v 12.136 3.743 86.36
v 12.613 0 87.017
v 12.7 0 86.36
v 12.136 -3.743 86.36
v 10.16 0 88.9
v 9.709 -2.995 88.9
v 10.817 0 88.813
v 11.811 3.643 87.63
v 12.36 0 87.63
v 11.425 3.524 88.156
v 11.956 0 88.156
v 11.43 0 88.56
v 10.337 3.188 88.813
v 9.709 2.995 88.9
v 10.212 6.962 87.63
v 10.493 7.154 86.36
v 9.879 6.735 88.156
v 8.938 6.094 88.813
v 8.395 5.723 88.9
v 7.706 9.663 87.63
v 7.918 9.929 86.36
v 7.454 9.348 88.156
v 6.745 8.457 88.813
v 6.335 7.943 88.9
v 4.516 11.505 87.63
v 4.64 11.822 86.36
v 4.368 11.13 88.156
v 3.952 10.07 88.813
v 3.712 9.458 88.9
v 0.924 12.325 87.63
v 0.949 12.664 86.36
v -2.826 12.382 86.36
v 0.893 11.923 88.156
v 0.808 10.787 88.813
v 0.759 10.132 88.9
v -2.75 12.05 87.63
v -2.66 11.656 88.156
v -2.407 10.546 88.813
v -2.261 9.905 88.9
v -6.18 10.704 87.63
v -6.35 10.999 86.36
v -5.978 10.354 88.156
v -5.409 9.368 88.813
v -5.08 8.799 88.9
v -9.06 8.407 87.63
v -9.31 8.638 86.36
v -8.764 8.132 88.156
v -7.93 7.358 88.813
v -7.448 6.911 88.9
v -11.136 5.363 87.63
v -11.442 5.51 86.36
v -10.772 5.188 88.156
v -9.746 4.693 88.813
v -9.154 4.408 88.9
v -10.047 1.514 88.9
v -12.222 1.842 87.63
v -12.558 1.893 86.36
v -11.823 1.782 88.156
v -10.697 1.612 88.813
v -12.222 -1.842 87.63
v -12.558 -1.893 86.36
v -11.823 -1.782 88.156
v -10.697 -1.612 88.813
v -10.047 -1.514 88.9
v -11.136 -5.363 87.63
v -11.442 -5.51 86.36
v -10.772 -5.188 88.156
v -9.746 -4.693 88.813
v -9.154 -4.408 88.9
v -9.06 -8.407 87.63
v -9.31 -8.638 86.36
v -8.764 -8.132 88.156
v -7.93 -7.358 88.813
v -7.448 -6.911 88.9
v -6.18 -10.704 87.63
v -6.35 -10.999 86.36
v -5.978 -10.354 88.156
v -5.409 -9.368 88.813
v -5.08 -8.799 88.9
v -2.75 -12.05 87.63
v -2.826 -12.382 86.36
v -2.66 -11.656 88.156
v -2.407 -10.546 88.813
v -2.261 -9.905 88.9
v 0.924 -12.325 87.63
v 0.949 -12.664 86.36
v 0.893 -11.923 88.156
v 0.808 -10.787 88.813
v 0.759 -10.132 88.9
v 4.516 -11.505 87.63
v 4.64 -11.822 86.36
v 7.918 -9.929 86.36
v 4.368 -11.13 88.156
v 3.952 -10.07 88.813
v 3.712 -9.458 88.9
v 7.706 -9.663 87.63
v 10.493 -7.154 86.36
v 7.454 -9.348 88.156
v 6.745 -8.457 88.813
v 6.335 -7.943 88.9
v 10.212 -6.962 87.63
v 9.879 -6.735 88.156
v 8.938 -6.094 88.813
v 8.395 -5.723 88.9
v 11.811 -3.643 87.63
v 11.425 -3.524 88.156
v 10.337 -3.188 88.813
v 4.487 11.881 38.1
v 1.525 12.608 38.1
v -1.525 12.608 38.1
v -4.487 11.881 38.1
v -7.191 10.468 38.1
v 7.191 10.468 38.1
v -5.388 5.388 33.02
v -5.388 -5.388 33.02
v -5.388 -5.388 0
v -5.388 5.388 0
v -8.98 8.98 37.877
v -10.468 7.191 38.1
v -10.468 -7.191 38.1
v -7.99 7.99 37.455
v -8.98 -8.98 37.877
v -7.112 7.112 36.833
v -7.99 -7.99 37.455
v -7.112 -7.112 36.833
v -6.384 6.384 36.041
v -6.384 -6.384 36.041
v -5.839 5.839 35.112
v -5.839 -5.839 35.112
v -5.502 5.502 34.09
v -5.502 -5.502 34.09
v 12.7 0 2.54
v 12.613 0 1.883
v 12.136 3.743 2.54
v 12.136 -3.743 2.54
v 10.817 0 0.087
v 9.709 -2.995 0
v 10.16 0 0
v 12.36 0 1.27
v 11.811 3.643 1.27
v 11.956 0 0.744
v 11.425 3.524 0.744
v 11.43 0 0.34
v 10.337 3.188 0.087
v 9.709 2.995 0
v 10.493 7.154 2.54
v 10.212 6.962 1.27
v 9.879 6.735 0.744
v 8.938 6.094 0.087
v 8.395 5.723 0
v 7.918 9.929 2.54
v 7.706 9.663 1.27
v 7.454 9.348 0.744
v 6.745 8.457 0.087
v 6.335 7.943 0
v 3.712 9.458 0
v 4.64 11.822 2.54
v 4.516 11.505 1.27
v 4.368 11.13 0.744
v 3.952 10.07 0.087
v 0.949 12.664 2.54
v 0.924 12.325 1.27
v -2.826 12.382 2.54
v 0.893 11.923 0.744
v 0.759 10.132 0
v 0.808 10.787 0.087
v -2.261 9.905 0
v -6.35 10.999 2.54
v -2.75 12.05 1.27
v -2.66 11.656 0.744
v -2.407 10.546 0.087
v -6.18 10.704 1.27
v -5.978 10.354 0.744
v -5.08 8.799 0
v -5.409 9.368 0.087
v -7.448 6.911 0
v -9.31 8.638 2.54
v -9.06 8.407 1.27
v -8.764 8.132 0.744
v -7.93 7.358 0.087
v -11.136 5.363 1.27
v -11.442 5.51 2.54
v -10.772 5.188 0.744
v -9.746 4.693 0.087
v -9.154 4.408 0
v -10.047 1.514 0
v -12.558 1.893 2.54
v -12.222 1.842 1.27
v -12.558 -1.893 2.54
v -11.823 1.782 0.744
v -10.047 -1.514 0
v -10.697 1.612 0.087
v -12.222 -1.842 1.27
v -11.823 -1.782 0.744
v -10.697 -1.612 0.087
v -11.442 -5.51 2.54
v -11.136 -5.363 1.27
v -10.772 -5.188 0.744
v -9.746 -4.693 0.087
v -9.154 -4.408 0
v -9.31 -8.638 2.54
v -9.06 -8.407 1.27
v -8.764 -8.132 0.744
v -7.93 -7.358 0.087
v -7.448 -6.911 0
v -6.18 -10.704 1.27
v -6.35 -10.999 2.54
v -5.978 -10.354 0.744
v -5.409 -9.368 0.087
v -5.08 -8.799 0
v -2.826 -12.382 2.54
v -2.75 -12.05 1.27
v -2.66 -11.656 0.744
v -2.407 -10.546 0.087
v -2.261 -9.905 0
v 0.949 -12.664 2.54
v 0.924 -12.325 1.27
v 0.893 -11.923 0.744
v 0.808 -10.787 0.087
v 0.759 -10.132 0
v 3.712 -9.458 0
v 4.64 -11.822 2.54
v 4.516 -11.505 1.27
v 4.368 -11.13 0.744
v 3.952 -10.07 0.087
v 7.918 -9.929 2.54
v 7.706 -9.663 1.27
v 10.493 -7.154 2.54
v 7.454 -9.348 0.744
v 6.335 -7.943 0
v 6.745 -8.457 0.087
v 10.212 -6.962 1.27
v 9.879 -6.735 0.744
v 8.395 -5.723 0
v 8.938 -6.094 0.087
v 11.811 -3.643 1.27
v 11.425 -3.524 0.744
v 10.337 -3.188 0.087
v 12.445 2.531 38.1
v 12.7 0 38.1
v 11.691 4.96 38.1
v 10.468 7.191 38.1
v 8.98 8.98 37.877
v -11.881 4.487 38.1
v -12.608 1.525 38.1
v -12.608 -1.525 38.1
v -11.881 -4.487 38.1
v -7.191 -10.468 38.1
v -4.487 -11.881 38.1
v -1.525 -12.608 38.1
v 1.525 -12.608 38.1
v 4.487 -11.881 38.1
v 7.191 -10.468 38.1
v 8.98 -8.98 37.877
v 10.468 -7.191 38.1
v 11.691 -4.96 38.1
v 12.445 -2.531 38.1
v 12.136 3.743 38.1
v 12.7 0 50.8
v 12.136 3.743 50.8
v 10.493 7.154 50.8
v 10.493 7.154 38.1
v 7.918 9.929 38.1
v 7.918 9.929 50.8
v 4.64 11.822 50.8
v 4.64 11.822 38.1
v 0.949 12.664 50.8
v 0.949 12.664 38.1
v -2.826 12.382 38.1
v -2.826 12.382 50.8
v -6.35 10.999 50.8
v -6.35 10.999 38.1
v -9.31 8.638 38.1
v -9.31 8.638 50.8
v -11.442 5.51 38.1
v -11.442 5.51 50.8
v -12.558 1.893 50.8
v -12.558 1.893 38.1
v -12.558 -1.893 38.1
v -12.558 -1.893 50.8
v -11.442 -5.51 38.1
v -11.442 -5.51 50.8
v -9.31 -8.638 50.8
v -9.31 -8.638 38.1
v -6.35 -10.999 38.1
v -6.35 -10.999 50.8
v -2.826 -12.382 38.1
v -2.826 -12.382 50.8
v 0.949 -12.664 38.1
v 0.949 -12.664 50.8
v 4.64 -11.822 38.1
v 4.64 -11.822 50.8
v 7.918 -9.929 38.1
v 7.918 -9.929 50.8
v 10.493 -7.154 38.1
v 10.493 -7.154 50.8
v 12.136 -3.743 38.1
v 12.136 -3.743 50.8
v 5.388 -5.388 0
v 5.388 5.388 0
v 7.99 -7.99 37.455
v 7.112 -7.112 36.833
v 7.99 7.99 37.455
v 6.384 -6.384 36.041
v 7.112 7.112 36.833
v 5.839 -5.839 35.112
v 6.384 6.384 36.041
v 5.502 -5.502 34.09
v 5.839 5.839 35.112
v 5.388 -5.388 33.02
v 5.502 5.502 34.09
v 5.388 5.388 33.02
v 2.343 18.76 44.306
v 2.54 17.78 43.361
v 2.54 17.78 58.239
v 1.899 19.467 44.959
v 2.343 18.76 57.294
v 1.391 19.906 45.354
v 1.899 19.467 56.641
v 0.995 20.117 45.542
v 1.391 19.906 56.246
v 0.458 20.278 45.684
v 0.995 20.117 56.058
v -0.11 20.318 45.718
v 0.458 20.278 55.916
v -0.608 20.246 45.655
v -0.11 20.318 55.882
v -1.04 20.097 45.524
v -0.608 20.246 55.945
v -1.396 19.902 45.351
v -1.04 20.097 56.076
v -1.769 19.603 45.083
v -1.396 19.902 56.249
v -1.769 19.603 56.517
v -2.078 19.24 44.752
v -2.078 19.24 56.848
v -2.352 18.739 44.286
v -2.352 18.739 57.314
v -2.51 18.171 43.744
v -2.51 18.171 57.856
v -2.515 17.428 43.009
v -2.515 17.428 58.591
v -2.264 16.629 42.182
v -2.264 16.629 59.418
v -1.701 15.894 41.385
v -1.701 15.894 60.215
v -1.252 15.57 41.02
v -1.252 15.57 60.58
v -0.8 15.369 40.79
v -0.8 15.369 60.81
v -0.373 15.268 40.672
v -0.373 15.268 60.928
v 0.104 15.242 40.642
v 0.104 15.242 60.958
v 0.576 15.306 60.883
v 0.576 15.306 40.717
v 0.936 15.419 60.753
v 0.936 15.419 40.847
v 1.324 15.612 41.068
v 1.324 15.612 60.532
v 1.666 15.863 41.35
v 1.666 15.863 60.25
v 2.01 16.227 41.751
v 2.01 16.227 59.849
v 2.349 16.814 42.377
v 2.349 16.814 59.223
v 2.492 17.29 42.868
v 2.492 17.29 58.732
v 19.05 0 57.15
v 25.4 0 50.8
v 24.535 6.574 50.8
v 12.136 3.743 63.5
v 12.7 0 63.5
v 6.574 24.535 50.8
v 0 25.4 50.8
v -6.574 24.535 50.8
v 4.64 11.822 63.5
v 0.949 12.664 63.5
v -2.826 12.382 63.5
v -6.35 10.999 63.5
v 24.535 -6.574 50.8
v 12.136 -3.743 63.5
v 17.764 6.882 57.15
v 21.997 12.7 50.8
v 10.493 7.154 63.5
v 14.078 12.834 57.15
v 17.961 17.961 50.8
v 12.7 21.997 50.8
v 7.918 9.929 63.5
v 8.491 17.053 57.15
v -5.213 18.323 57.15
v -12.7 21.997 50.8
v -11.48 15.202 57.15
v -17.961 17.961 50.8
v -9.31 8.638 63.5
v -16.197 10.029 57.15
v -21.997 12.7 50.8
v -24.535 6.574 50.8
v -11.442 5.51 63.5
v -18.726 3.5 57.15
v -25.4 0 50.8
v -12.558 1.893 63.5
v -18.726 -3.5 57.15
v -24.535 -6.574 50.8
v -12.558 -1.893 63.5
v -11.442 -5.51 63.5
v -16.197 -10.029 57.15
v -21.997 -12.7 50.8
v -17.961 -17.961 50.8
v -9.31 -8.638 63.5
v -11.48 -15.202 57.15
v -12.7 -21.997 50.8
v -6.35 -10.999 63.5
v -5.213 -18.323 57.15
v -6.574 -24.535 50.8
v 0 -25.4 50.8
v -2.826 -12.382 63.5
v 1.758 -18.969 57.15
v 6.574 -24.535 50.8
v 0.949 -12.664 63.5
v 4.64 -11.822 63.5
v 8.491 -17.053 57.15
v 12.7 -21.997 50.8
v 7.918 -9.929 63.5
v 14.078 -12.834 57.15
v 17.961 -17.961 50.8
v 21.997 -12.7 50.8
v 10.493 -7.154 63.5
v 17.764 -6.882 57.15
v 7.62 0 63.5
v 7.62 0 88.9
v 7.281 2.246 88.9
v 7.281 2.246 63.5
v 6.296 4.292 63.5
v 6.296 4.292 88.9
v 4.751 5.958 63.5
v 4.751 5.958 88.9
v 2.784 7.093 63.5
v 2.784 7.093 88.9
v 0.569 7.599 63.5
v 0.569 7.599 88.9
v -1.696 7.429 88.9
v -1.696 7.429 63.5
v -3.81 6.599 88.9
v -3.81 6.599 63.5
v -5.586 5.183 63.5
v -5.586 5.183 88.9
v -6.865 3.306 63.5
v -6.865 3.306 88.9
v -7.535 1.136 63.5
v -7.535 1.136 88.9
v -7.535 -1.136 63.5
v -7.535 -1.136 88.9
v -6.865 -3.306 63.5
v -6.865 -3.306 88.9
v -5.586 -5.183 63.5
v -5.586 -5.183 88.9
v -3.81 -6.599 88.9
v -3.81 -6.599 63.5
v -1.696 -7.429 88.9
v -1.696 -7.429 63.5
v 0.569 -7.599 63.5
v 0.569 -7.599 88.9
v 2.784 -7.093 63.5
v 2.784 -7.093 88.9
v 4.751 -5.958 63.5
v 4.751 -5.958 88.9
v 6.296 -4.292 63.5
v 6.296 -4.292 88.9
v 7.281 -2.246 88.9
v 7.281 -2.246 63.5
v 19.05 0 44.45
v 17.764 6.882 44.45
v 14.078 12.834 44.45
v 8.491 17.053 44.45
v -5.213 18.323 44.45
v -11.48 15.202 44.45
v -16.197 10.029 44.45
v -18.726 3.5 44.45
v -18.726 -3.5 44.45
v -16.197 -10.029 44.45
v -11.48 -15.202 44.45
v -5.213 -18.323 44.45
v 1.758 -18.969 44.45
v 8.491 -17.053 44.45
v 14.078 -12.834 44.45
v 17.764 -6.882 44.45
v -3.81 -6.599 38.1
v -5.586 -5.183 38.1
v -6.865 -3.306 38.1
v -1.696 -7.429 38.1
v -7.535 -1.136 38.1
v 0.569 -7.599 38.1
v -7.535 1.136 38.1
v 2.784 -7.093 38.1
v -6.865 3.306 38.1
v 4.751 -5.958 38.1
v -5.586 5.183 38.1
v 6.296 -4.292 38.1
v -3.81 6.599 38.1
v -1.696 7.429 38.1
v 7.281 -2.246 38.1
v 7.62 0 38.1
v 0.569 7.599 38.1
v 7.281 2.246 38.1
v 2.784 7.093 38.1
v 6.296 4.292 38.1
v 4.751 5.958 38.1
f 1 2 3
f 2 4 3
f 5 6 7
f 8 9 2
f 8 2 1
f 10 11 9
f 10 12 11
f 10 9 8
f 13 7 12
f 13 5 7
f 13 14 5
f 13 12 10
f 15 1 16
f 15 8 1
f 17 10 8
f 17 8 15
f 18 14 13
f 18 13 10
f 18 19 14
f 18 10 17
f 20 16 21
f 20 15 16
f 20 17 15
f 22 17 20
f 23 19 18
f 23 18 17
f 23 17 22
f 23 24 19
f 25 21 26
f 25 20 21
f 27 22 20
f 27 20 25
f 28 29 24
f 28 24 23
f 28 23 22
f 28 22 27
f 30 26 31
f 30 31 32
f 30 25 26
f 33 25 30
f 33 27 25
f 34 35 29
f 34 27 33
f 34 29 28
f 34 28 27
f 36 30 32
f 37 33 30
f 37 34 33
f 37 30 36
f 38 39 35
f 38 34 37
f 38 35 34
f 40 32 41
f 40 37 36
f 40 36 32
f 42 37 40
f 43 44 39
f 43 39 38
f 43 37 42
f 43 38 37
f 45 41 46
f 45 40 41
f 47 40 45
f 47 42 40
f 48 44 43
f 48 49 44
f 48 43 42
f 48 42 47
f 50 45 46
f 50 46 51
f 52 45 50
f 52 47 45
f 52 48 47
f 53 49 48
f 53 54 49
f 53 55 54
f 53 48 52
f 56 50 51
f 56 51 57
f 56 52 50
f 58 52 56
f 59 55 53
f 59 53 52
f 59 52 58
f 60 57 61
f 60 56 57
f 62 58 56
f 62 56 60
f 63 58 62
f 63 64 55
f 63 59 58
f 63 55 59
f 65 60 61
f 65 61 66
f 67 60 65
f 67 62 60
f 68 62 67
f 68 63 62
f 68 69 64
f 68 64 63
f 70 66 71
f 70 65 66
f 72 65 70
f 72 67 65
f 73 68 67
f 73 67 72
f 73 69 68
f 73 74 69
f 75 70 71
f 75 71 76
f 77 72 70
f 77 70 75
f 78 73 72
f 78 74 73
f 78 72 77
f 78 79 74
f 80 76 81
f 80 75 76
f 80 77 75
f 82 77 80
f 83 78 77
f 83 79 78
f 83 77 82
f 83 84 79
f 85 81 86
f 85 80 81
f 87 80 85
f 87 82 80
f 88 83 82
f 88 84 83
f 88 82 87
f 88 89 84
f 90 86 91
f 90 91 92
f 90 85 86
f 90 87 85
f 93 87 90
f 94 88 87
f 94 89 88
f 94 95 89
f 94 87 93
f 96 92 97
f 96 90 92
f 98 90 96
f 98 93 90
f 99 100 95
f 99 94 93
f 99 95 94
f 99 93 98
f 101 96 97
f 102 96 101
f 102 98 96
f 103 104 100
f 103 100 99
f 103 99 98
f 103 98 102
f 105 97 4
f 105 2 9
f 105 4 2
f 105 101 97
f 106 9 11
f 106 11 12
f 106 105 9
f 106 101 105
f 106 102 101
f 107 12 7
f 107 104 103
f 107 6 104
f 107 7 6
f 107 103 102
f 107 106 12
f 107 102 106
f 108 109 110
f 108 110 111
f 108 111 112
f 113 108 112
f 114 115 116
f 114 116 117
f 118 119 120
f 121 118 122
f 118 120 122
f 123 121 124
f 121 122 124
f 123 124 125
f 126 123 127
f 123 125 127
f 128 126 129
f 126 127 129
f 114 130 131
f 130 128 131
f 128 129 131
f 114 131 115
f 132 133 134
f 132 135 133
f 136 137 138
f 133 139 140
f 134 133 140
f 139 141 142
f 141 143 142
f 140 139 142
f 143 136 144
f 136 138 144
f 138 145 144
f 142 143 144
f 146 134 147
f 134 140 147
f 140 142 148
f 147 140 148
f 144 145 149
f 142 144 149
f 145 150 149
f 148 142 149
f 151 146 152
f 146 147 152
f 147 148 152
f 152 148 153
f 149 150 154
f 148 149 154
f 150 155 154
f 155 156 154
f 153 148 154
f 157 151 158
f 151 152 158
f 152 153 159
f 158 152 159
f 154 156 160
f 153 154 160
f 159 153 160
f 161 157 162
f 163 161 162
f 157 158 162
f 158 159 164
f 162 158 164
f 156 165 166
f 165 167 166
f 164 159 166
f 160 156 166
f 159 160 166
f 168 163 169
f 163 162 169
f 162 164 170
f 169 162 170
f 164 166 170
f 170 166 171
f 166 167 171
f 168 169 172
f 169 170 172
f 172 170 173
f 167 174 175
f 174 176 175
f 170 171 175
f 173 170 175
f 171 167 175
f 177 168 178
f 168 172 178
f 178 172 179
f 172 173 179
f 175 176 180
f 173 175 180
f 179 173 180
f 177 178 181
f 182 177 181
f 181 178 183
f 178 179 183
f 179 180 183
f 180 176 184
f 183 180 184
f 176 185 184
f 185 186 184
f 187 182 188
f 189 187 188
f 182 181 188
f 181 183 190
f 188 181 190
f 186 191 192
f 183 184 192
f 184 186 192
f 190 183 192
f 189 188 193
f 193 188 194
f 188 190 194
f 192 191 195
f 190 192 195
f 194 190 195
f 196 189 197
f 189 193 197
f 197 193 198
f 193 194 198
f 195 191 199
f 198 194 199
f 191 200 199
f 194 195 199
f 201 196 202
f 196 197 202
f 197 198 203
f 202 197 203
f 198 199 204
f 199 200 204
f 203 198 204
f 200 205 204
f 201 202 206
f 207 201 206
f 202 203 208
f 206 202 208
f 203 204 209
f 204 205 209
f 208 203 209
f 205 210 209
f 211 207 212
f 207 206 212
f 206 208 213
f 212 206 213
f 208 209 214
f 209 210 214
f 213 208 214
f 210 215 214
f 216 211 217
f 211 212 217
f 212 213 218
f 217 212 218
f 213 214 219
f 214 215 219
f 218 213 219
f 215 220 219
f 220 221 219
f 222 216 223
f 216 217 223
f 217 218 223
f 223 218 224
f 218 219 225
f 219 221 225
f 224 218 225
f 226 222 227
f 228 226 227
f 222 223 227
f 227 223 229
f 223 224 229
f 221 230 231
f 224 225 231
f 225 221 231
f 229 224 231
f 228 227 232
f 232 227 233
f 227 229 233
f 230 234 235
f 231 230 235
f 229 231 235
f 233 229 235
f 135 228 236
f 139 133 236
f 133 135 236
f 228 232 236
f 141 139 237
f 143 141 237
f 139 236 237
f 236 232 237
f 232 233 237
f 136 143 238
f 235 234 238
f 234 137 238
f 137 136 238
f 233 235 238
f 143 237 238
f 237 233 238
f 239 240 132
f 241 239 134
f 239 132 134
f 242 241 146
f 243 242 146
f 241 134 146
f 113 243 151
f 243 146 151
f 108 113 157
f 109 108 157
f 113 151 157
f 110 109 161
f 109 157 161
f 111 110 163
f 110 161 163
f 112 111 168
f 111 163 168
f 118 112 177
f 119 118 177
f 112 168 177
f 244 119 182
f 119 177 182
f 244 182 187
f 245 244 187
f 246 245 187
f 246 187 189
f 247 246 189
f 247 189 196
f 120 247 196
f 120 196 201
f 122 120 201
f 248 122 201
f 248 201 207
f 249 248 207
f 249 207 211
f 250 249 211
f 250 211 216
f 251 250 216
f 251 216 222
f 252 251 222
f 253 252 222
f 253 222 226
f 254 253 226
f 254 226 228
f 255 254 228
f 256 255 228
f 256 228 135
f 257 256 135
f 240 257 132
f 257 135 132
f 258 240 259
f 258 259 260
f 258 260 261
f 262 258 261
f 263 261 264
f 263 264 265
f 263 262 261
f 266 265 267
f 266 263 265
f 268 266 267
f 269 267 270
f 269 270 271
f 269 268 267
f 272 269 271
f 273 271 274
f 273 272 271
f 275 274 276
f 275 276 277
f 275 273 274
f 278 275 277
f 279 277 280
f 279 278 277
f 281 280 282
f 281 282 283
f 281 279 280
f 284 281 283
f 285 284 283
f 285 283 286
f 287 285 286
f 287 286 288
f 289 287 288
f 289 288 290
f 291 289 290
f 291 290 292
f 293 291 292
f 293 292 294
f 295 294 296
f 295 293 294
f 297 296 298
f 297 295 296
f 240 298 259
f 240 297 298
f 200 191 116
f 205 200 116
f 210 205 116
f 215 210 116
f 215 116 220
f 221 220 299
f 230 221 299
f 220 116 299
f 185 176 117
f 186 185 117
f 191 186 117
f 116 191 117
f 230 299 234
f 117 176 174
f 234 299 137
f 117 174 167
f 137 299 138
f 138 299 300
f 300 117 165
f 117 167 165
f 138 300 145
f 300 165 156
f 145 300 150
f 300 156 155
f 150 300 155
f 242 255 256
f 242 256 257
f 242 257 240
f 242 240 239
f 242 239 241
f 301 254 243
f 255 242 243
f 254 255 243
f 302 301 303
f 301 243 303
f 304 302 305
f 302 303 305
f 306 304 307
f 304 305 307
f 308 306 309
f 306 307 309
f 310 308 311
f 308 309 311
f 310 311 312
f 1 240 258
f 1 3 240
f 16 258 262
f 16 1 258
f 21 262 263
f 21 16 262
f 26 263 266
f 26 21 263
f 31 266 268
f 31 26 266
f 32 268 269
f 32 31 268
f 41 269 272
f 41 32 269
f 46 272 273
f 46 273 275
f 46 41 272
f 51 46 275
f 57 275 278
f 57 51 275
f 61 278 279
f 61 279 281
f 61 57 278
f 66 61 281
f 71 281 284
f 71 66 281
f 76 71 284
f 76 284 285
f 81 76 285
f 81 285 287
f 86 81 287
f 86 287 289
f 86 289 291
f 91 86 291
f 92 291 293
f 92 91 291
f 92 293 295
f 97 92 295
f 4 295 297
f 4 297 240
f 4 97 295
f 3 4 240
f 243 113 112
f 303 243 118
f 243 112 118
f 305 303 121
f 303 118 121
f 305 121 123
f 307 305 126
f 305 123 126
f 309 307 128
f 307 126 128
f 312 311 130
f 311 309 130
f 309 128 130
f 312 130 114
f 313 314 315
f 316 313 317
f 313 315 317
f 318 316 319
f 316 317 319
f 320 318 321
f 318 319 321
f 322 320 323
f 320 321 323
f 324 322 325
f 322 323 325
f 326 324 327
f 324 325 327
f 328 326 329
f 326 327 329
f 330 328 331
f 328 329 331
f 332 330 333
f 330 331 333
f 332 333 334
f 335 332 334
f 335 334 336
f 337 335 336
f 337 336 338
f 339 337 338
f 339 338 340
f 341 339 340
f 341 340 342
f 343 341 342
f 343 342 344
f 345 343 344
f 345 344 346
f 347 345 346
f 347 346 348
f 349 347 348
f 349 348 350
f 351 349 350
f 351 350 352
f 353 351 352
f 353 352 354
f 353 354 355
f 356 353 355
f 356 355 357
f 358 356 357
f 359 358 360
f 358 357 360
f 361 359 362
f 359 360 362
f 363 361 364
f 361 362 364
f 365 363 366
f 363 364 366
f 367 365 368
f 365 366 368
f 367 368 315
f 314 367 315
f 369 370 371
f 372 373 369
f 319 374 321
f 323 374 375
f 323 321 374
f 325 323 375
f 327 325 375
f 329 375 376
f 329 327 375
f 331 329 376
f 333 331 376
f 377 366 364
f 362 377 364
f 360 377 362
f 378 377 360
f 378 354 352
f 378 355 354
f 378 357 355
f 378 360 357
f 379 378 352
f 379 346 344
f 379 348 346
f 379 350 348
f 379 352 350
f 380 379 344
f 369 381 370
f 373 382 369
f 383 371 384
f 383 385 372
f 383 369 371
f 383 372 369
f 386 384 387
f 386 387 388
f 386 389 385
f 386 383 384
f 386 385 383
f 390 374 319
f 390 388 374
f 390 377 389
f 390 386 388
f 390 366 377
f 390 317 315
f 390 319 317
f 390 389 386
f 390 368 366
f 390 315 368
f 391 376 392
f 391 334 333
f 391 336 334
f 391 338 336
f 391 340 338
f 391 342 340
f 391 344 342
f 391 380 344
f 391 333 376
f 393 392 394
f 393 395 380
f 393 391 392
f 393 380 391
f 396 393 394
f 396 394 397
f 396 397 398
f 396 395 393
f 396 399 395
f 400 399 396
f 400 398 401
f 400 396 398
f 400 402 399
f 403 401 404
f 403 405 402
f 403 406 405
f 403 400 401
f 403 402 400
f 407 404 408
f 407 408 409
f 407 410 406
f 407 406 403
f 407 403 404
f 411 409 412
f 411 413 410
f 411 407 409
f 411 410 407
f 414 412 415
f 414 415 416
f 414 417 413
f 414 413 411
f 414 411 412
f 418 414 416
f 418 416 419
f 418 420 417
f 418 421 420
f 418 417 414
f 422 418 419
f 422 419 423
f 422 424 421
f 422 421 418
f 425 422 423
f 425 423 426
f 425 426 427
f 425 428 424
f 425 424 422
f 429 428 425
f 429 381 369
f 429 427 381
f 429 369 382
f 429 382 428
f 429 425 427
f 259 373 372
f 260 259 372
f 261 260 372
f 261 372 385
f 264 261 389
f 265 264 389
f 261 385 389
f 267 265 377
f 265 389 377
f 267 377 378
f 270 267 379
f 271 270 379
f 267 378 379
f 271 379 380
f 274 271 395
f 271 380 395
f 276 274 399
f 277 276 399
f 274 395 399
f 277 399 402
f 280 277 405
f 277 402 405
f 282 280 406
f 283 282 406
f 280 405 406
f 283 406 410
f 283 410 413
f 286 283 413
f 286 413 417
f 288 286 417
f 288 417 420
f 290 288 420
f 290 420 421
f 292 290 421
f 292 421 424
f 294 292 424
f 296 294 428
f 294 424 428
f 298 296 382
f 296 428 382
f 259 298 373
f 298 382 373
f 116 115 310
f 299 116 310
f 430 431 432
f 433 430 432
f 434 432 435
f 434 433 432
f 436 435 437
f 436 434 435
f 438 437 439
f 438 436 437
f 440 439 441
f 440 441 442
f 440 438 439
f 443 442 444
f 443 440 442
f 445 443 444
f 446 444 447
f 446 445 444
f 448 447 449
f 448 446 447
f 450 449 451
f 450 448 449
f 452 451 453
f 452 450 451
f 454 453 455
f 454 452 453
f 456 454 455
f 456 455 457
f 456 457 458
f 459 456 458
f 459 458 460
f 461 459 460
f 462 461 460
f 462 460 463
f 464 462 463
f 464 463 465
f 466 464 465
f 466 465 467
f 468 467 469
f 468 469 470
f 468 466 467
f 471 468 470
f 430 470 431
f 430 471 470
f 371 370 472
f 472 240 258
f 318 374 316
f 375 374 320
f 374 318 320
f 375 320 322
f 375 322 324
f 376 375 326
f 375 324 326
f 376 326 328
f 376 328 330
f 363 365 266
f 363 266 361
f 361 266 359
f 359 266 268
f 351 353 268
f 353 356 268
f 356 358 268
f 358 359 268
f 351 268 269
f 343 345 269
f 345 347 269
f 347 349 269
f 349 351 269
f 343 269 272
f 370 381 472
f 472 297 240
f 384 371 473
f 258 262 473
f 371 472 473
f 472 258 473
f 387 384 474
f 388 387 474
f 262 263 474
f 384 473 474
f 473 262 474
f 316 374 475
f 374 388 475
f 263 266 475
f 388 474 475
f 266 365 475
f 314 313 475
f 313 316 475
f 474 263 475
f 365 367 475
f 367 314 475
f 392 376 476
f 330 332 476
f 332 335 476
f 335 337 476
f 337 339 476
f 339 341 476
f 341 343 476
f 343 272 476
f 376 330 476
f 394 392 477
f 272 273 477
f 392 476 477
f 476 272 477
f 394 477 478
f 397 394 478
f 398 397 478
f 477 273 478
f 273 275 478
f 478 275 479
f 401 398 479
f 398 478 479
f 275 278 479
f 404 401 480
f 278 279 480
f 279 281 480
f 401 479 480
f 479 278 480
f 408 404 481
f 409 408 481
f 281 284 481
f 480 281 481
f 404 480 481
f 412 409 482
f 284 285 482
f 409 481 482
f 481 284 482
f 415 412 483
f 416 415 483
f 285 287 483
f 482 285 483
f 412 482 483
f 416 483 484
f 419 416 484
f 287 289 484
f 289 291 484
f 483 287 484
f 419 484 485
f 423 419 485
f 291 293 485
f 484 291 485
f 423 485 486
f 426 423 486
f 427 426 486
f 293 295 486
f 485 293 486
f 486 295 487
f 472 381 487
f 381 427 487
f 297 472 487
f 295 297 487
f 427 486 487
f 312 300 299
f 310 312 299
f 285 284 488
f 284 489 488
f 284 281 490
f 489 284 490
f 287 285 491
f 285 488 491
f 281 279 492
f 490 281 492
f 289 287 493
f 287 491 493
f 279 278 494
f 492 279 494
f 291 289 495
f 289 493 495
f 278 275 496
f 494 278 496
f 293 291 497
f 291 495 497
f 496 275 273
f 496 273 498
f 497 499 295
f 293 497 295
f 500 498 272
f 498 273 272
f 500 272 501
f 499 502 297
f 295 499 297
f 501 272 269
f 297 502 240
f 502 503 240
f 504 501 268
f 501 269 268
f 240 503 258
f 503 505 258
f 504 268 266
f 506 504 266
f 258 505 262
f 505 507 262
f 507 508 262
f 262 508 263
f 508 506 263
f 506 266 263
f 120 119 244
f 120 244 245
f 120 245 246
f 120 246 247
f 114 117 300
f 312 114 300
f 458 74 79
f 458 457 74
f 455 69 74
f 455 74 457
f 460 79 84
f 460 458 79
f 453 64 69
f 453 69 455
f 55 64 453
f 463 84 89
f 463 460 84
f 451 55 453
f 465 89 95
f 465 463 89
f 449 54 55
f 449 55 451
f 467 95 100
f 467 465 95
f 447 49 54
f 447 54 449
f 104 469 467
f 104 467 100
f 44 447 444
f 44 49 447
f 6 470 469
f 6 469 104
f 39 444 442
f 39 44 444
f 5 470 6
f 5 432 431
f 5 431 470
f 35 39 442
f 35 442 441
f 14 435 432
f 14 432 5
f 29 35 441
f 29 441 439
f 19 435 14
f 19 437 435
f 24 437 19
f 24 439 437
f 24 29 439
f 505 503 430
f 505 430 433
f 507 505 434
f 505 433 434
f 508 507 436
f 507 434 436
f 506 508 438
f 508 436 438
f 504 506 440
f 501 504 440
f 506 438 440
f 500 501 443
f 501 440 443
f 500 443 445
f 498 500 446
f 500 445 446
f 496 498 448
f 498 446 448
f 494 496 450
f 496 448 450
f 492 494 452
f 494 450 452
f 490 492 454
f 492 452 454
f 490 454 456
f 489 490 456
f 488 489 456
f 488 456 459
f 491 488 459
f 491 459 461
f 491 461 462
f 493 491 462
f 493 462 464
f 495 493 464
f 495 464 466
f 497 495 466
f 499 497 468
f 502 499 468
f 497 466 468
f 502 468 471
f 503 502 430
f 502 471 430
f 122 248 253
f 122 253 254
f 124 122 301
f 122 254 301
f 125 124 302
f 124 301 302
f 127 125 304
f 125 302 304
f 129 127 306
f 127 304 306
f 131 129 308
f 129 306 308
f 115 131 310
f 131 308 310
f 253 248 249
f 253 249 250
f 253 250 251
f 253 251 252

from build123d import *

# Parameters (mm, degrees)
F0_R         = 12.7
F1_DEPTH     = 38.1
F2_R         = 25.4
F2_R_2       = 12.7
F3_DEPTH     = 12.7
F4_R         = 2.54
F5_T1_DEPTH  = 10.7763073453
F5_T3_DEPTH  = 10.7763073453
F5_T9_DEPTH  = 23.4763073453
F5_S10_R     = 12.7
F5_T11_DEPTH = 14
F5_T15_DEPTH = 23.4763073453
F5_S16_R     = 12.7
F5_T17_DEPTH = 14
F5_T24_DEPTH = 23.4763073453
F5_S25_R     = 12.7
F5_T26_DEPTH = 14
F5_T30_DEPTH = 23.4763073453
F5_S31_R     = 12.7
F5_T32_DEPTH = 14
F5_T39_DEPTH = 23.4763073453
F5_S40_R     = 12.7
F5_T41_DEPTH = 14
F5_T45_DEPTH = 23.4763073453
F5_S46_R     = 12.7
F5_T47_DEPTH = 14
F5_T54_DEPTH = 23.4763073453
F5_S55_R     = 12.7
F5_T56_DEPTH = 14
F5_T60_DEPTH = 23.4763073453
F5_S61_R     = 12.7
F5_T62_DEPTH = 14
F8_R         = 12.7
F8_R_2       = 7.62
F9_DEPTH     = 25.4
F10_R        = 2.54
F11_DEPTH    = 25.4
F12_SIZE     = 12.69999
F13_R        = 2.54
F14_DEPTH    = 152.4


# Not quite as in the source:
# - a fillet or chamfer that OpenCascade refuses, or shapes differently, is made with other operations: its cross-section is extruded or revolved along the edge and cut away or added
# - a fillet or chamfer is up to 0.001 mm smaller than in the source, because OpenCascade refuses the exact size


with BuildPart() as f1:
    # F0 (on Top) → F1 (new body)
    with BuildSketch(Plane.XY):
        Circle(F0_R)
        with BuildLine():
            ThreePointArc((5.3881536726, 5.3881536726), (7.0399620377, 2.9160477546), (7.62, 0))
            ThreePointArc((7.62, 0), (7.0399620377, -2.9160477546), (5.3881536726, -5.3881536726))
            ThreePointArc((5.3881536726, -5.3881536726), (0, -7.62), (-5.3881536726, -5.3881536726))
            ThreePointArc((-5.3881536726, -5.3881536726), (-7.62, 0), (-5.3881536726, 5.3881536726))
            ThreePointArc((-5.3881536726, 5.3881536726), (0, 7.62), (5.3881536726, 5.3881536726))
        make_face(mode=Mode.SUBTRACT)
        with BuildLine():
            ThreePointArc((-5.3881536726, -5.3881536726), (0, -7.62), (5.3881536726, -5.3881536726))
            Line((5.3881536726, -5.3881536726), (-5.3881536726, -5.3881536726))
        make_face()
        with BuildLine():
            Line((-5.3881536726, -5.3881536726), (-5.3881536726, 5.3881536726))
            ThreePointArc((-5.3881536726, 5.3881536726), (-7.62, 0), (-5.3881536726, -5.3881536726))
        make_face()
        with BuildLine():
            ThreePointArc((5.3881536726, -5.3881536726), (7.0399620377, -2.9160477546), (7.62, 0))
            ThreePointArc((7.62, 0), (7.0399620377, 2.9160477546), (5.3881536726, 5.3881536726))
            Line((5.3881536726, 5.3881536726), (5.3881536726, -5.3881536726))
        make_face()
        with BuildLine():
            Line((-5.3881536726, 5.3881536726), (5.3881536726, 5.3881536726))
            ThreePointArc((5.3881536726, 5.3881536726), (0, 7.62), (-5.3881536726, 5.3881536726))
        make_face()
    extrude(amount=F1_DEPTH)

    # F4
    f4_edges = [f1.edges().sort_by_distance(p)[0] for p in [
        (-12.7, 0, 0),
    ]]
    fillet(f4_edges, radius=F4_R)

    # F5: fillet of radius 5.08 on 4 edges, made by hand

    # F5_s2 → F5_t1 (cut)
    with BuildSketch(Plane.XZ.offset(-5.3881536726)):
        with BuildLine():
            ThreePointArc((10.4681536726, 38.1), (6.8760512242, 36.6121024484), (5.3881536726, 33.02))
            Line((5.3881536726, 33.02), (5.3881536726, 38.1))
            Line((5.3881536726, 38.1), (10.4681536726, 38.1))
        make_face()
        with BuildLine():
            ThreePointArc((-10.4681536726, 38.1), (-6.8760512242, 36.6121024484), (-5.3881536726, 33.02))
            Line((-5.3881536726, 33.02), (-5.3881536726, 38.1))
            Line((-5.3881536726, 38.1), (-10.4681536726, 38.1))
        make_face()
    extrude(amount=F5_T1_DEPTH, mode=Mode.SUBTRACT)

    # F5_s4 → F5_t3 (cut)
    with BuildSketch(Plane.YZ.offset(-5.3881536726)):
        with BuildLine():
            ThreePointArc((-10.4681536726, 38.1), (-6.8760512242, 36.6121024484), (-5.3881536726, 33.02))
            Line((-5.3881536726, 33.02), (-5.3881536726, 38.1))
            Line((-5.3881536726, 38.1), (-10.4681536726, 38.1))
        make_face()
        with BuildLine():
            ThreePointArc((10.4681536726, 38.1), (6.8760512242, 36.6121024484), (5.3881536726, 33.02))
            Line((5.3881536726, 33.02), (5.3881536726, 38.1))
            Line((5.3881536726, 38.1), (10.4681536726, 38.1))
        make_face()
    extrude(amount=F5_T3_DEPTH, mode=Mode.SUBTRACT)


with BuildPart() as f3:
    # F2 (on face) → F3 (new body)
    with BuildSketch(Plane.XY.offset(38.1)):
        Circle(F2_R)
        Circle(F2_R_2, mode=Mode.SUBTRACT)
    extrude(amount=F3_DEPTH)

    # F6: F3 across face


with BuildPart() as f5_tool7:
    # F5_s8 → F5_t9 (new body)
    with BuildSketch(Plane.YZ.offset(-5.3881536726)):
        with BuildLine():
            ThreePointArc((10.4681536726, 38.1), (6.8760512242, 36.6121024484), (5.3881536726, 33.02))
            Line((5.3881536726, 33.02), (5.3881536726, 38.1))
            Line((5.3881536726, 38.1), (10.4681536726, 38.1))
        make_face()
    extrude(amount=F5_T9_DEPTH)

    # F5_s10 → F5_t11 (intersect, symmetric)
    with BuildSketch(Plane.XY.offset(35.6)):
        Circle(F5_S10_R)
    extrude(amount=F5_T11_DEPTH, both=True, mode=Mode.INTERSECT)

    split(bisect_by=Plane.YZ.offset(5.3881536726), keep=Keep.TOP)


with BuildPart() as f5_tool13:
    # F5_s14 → F5_t15 (new body)
    with BuildSketch(Plane.XZ.offset(-18.0881536726)):
        with BuildLine():
            ThreePointArc((10.4681536726, 38.1), (6.8760512242, 36.6121024484), (5.3881536726, 33.02))
            Line((5.3881536726, 33.02), (5.3881536726, 38.1))
            Line((5.3881536726, 38.1), (10.4681536726, 38.1))
        make_face()
    extrude(amount=F5_T15_DEPTH)

    # F5_s16 → F5_t17 (intersect, symmetric)
    with BuildSketch(Plane.XY.offset(35.6)):
        Circle(F5_S16_R)
    extrude(amount=F5_T17_DEPTH, both=True, mode=Mode.INTERSECT)

    split(bisect_by=Plane.XZ.offset(-5.3881536726), keep=Keep.BOTTOM)


with BuildPart() as f5_tool7_1:
    add(f5_tool7.part)

    # F5_t19: intersect F5_tool13
    add(f5_tool13.part, mode=Mode.INTERSECT)


with BuildPart() as f1_1:
    add(f1.part)

    # F5_t5: cut F5_tool7
    add(f5_tool7_1.part, mode=Mode.SUBTRACT)


with BuildPart() as f5_tool22:
    # F5_s23 → F5_t24 (new body)
    with BuildSketch(Plane.YZ.offset(18.0881536726)):
        with BuildLine():
            ThreePointArc((-10.4681536726, 38.1), (-6.8760512242, 36.6121024484), (-5.3881536726, 33.02))
            Line((-5.3881536726, 33.02), (-5.3881536726, 38.1))
            Line((-5.3881536726, 38.1), (-10.4681536726, 38.1))
        make_face()
    extrude(amount=-F5_T24_DEPTH)

    # F5_s25 → F5_t26 (intersect, symmetric)
    with BuildSketch(Plane.XY.offset(35.6)):
        Circle(F5_S25_R)
    extrude(amount=F5_T26_DEPTH, both=True, mode=Mode.INTERSECT)

    split(bisect_by=Plane.YZ.offset(5.3881536726), keep=Keep.TOP)


with BuildPart() as f5_tool28:
    # F5_s29 → F5_t30 (new body)
    with BuildSketch(Plane.XZ.offset(-5.3881536726)):
        with BuildLine():
            ThreePointArc((10.4681536726, 38.1), (6.8760512242, 36.6121024484), (5.3881536726, 33.02))
            Line((5.3881536726, 33.02), (5.3881536726, 38.1))
            Line((5.3881536726, 38.1), (10.4681536726, 38.1))
        make_face()
    extrude(amount=F5_T30_DEPTH)

    # F5_s31 → F5_t32 (intersect, symmetric)
    with BuildSketch(Plane.XY.offset(35.6)):
        Circle(F5_S31_R)
    extrude(amount=F5_T32_DEPTH, both=True, mode=Mode.INTERSECT)

    split(bisect_by=Plane.XZ.offset(5.3881536726), keep=Keep.TOP)


with BuildPart() as f5_tool22_1:
    add(f5_tool22.part)

    # F5_t34: intersect F5_tool28
    add(f5_tool28.part, mode=Mode.INTERSECT)


with BuildPart() as f1_2:
    add(f1_1.part)

    # F5_t20: cut F5_tool22
    add(f5_tool22_1.part, mode=Mode.SUBTRACT)


with BuildPart() as f5_tool37:
    # F5_s38 → F5_t39 (new body)
    with BuildSketch(Plane.YZ.offset(5.3881536726)):
        with BuildLine():
            ThreePointArc((-10.4681536726, 38.1), (-6.8760512242, 36.6121024484), (-5.3881536726, 33.02))
            Line((-5.3881536726, 33.02), (-5.3881536726, 38.1))
            Line((-5.3881536726, 38.1), (-10.4681536726, 38.1))
        make_face()
    extrude(amount=-F5_T39_DEPTH)

    # F5_s40 → F5_t41 (intersect, symmetric)
    with BuildSketch(Plane.XY.offset(35.6)):
        Circle(F5_S40_R)
    extrude(amount=F5_T41_DEPTH, both=True, mode=Mode.INTERSECT)

    split(bisect_by=Plane.YZ.offset(-5.3881536726), keep=Keep.BOTTOM)


with BuildPart() as f5_tool43:
    # F5_s44 → F5_t45 (new body)
    with BuildSketch(Plane.XZ.offset(18.0881536726)):
        with BuildLine():
            ThreePointArc((-10.4681536726, 38.1), (-6.8760512242, 36.6121024484), (-5.3881536726, 33.02))
            Line((-5.3881536726, 33.02), (-5.3881536726, 38.1))
            Line((-5.3881536726, 38.1), (-10.4681536726, 38.1))
        make_face()
    extrude(amount=-F5_T45_DEPTH)

    # F5_s46 → F5_t47 (intersect, symmetric)
    with BuildSketch(Plane.XY.offset(35.6)):
        Circle(F5_S46_R)
    extrude(amount=F5_T47_DEPTH, both=True, mode=Mode.INTERSECT)

    split(bisect_by=Plane.XZ.offset(5.3881536726), keep=Keep.TOP)


with BuildPart() as f5_tool37_1:
    add(f5_tool37.part)

    # F5_t49: intersect F5_tool43
    add(f5_tool43.part, mode=Mode.INTERSECT)


with BuildPart() as f1_3:
    add(f1_2.part)

    # F5_t35: cut F5_tool37
    add(f5_tool37_1.part, mode=Mode.SUBTRACT)


with BuildPart() as f5_tool52:
    # F5_s53 → F5_t54 (new body)
    with BuildSketch(Plane.XZ.offset(5.3881536726)):
        with BuildLine():
            ThreePointArc((-10.4681536726, 38.1), (-6.8760512242, 36.6121024484), (-5.3881536726, 33.02))
            Line((-5.3881536726, 33.02), (-5.3881536726, 38.1))
            Line((-5.3881536726, 38.1), (-10.4681536726, 38.1))
        make_face()
    extrude(amount=-F5_T54_DEPTH)

    # F5_s55 → F5_t56 (intersect, symmetric)
    with BuildSketch(Plane.XY.offset(35.6)):
        Circle(F5_S55_R)
    extrude(amount=F5_T56_DEPTH, both=True, mode=Mode.INTERSECT)

    split(bisect_by=Plane.XZ.offset(-5.3881536726), keep=Keep.BOTTOM)


with BuildPart() as f5_tool58:
    # F5_s59 → F5_t60 (new body)
    with BuildSketch(Plane.YZ.offset(-18.0881536726)):
        with BuildLine():
            ThreePointArc((10.4681536726, 38.1), (6.8760512242, 36.6121024484), (5.3881536726, 33.02))
            Line((5.3881536726, 33.02), (5.3881536726, 38.1))
            Line((5.3881536726, 38.1), (10.4681536726, 38.1))
        make_face()
    extrude(amount=F5_T60_DEPTH)

    # F5_s61 → F5_t62 (intersect, symmetric)
    with BuildSketch(Plane.XY.offset(35.6)):
        Circle(F5_S61_R)
    extrude(amount=F5_T62_DEPTH, both=True, mode=Mode.INTERSECT)

    split(bisect_by=Plane.YZ.offset(-5.3881536726), keep=Keep.BOTTOM)


with BuildPart() as f5_tool52_1:
    add(f5_tool52.part)

    # F5_t64: intersect F5_tool58
    add(f5_tool58.part, mode=Mode.INTERSECT)


with BuildPart() as f1_4:
    add(f1_3.part)

    # F5_t50: cut F5_tool52
    add(f5_tool52_1.part, mode=Mode.SUBTRACT)


with BuildPart() as f3_1:
    add(f3.part)
    add(f3.part.mirror(Plane.XY.offset(50.8)))

    # F12 (size 12.7 in the source; OpenCascade refuses exactly that, so slightly less here)
    f12_edges = [f3_1.edges().sort_by_distance(p)[0] for p in [
        (-25.4, 0, 38.1),
        (-25.4, 0, 63.5),
    ]]
    chamfer(f12_edges, length=F12_SIZE)

    # F13 (on face) → F14 (cut)
    with BuildSketch(Plane.XY.offset(88.9)):
        with Locations((0, 17.78)):
            Circle(F13_R)
    extrude(amount=-F14_DEPTH, mode=Mode.SUBTRACT)


with BuildPart() as f9:
    # F8 (on offset) → F9 (new body)
    with BuildSketch(Plane.XY.offset(63.5)):
        Circle(F8_R)
        Circle(F8_R_2, mode=Mode.SUBTRACT)
    extrude(amount=F9_DEPTH)

    # F10
    f10_edges = [f9.edges().sort_by_distance(p)[0] for p in [
        (-12.7, 0, 88.9),
    ]]
    fillet(f10_edges, radius=F10_R)

    # F8 (on offset) → F11 (join)
    with BuildSketch(Plane.XY.offset(63.5)):
        Circle(F8_R)
        Circle(F8_R_2, mode=Mode.SUBTRACT)
    extrude(amount=-F11_DEPTH)


solid = Compound([f1_4.part, f3_1.part, f9.part])
